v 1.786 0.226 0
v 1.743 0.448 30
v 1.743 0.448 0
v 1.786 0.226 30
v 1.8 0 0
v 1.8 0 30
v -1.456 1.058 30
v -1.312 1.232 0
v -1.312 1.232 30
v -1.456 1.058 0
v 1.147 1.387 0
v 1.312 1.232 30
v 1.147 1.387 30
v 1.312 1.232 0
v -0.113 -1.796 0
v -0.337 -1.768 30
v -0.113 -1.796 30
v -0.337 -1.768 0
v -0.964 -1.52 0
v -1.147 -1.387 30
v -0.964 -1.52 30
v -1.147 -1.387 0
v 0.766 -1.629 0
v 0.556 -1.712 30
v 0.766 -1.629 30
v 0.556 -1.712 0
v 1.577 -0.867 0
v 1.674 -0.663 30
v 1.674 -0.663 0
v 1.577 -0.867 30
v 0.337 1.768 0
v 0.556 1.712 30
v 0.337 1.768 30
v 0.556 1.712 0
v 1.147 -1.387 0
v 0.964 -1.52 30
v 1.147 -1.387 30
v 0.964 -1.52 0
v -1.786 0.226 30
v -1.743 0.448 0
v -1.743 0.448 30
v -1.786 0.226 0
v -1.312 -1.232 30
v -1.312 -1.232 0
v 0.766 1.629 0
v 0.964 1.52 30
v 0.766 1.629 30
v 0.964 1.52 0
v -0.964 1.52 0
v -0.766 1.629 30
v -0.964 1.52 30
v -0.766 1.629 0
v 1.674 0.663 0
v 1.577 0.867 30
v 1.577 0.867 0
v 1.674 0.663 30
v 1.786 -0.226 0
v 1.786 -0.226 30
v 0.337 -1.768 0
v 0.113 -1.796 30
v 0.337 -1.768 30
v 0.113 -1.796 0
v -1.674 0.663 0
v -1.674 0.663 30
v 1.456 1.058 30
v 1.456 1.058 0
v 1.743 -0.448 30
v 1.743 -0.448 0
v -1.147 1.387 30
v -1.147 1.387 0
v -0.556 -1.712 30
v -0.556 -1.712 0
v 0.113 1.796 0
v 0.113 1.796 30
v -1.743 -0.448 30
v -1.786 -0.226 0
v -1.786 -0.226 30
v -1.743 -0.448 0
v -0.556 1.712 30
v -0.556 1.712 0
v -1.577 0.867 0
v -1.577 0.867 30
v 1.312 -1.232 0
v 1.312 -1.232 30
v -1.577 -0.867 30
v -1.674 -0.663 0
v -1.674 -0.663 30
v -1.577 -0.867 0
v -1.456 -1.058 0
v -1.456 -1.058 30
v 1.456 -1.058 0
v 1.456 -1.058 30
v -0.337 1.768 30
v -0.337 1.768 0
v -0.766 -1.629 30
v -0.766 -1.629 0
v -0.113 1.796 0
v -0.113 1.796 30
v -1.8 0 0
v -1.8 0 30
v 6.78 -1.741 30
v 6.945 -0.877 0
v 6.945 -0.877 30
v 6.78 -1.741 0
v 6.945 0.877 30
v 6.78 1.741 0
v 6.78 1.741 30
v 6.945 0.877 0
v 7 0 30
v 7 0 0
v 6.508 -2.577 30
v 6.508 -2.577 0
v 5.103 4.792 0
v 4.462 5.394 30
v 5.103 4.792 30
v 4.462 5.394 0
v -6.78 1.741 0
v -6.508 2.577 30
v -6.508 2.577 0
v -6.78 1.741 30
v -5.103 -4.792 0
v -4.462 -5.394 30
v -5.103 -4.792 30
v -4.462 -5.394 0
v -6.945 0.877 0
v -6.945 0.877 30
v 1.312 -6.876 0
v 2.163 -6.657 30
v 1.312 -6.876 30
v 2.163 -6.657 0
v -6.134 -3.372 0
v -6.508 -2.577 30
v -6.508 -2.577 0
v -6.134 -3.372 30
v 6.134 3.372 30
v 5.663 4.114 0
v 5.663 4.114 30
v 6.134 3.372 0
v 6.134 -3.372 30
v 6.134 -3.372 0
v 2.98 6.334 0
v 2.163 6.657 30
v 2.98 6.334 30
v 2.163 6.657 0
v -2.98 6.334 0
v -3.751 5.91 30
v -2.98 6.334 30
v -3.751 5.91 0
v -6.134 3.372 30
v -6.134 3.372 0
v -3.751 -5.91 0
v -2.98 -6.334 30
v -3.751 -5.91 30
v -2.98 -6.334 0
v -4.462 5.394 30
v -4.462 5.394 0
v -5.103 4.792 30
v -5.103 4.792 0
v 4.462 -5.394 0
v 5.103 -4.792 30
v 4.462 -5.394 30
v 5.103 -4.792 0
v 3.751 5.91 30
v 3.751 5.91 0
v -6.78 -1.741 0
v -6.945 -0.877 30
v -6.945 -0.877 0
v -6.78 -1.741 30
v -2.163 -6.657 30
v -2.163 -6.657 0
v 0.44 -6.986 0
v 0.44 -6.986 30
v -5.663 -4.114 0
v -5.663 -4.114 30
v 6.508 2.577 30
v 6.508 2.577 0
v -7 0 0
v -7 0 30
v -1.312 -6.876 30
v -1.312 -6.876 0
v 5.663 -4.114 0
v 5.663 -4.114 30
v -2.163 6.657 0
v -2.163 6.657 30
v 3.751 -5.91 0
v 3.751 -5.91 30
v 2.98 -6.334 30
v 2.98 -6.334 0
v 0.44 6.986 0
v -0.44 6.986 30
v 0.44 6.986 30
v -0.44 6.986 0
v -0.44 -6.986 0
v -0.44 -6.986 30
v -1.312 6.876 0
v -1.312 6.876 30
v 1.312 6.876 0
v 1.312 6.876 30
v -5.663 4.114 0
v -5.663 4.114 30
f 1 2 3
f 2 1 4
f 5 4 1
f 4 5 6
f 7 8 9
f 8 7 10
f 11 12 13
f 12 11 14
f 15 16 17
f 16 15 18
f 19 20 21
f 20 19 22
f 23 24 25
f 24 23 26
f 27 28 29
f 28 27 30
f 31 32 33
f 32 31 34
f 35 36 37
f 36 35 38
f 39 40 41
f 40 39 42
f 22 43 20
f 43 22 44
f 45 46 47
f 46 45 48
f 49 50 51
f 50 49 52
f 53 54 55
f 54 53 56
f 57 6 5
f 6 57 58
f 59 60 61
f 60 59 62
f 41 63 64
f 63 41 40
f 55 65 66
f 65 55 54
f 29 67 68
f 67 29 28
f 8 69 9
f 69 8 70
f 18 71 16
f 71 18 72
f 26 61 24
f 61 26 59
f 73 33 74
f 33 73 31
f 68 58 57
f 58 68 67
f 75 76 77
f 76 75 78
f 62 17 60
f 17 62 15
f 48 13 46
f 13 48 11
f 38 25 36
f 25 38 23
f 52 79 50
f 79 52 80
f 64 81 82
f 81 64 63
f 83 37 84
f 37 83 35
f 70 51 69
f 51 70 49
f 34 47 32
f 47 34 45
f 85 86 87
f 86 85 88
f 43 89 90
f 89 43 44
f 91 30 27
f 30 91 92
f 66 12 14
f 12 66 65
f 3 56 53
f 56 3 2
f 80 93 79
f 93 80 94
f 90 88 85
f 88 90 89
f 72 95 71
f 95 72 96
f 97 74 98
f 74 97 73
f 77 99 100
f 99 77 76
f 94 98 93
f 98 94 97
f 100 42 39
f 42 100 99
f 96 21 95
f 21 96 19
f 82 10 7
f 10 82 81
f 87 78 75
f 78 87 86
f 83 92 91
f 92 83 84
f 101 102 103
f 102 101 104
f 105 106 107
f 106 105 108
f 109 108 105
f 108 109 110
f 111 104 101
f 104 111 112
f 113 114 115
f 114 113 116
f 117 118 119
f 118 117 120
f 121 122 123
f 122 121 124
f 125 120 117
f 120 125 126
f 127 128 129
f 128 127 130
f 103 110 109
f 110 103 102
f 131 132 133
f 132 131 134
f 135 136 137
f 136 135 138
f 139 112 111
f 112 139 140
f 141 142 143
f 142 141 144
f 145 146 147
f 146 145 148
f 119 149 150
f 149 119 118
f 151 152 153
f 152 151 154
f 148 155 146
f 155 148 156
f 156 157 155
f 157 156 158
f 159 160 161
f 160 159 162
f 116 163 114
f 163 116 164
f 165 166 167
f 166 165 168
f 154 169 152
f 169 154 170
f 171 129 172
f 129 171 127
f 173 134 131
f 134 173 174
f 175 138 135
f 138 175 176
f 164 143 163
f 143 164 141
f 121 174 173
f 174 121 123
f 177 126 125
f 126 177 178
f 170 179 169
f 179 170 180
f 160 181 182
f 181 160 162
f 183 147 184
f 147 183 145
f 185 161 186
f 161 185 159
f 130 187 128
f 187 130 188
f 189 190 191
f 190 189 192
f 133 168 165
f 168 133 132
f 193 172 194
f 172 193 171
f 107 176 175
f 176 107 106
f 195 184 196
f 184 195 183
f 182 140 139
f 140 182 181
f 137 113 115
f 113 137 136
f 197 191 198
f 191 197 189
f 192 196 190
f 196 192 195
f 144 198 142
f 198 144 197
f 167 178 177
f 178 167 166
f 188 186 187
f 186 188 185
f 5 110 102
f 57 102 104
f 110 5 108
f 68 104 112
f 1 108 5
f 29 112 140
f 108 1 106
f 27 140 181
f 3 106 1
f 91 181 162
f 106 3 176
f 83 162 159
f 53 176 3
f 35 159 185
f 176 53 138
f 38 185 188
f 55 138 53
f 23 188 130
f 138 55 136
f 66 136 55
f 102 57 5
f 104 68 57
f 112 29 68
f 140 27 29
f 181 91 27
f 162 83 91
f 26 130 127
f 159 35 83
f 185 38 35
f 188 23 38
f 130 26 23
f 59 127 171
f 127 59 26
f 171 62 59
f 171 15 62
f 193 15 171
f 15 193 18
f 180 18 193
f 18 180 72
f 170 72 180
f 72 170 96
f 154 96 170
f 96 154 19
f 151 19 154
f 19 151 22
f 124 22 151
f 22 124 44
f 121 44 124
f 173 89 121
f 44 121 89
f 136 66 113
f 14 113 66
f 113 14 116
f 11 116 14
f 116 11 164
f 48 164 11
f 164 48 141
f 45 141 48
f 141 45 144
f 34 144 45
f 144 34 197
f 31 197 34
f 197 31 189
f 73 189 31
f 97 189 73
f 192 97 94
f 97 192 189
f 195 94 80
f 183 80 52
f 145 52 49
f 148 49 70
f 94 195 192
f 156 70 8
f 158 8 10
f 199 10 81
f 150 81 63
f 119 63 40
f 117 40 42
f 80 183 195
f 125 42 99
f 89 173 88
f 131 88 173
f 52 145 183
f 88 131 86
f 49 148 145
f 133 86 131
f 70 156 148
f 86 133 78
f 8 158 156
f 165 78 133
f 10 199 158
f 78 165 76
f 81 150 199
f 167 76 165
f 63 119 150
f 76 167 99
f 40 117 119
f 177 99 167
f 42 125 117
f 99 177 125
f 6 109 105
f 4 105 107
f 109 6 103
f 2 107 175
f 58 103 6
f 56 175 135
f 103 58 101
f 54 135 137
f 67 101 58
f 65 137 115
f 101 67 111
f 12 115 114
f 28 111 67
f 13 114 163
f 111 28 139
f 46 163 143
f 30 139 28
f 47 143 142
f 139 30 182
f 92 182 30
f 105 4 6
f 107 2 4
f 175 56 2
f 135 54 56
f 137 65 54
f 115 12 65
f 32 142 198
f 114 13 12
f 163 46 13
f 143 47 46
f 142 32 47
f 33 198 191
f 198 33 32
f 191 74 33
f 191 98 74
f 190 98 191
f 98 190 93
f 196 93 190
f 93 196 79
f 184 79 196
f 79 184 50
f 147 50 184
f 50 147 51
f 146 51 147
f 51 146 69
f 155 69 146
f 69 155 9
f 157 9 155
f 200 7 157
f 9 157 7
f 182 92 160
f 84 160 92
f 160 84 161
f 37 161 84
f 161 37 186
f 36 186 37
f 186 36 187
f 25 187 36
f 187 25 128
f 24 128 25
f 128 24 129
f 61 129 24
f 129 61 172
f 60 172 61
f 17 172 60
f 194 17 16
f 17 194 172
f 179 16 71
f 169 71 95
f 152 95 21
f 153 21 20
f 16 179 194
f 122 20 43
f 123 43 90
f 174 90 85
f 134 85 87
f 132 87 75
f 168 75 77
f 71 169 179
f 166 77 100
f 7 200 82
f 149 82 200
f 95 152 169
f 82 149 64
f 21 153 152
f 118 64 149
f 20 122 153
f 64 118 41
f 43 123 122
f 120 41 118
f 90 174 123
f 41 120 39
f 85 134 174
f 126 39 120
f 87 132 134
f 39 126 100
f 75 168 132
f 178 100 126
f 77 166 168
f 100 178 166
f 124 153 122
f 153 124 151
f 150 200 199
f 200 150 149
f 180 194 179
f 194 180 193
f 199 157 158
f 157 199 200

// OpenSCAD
$fn = 50;


difference() {
	union() {
		cylinder(h = 30, r = 7.0000000000);
	}
	union() {
		translate(v = [0.0000000000, 0.0000000000, -100.0000000000]) {
			cylinder(h = 200, r = 1.8000000000);
		}
		cylinder(h = 30, r = 1.8000000000);
		cylinder(h = 30, r = 1.8000000000);
		cylinder(h = 30, r = 1.8000000000);
	}
}
